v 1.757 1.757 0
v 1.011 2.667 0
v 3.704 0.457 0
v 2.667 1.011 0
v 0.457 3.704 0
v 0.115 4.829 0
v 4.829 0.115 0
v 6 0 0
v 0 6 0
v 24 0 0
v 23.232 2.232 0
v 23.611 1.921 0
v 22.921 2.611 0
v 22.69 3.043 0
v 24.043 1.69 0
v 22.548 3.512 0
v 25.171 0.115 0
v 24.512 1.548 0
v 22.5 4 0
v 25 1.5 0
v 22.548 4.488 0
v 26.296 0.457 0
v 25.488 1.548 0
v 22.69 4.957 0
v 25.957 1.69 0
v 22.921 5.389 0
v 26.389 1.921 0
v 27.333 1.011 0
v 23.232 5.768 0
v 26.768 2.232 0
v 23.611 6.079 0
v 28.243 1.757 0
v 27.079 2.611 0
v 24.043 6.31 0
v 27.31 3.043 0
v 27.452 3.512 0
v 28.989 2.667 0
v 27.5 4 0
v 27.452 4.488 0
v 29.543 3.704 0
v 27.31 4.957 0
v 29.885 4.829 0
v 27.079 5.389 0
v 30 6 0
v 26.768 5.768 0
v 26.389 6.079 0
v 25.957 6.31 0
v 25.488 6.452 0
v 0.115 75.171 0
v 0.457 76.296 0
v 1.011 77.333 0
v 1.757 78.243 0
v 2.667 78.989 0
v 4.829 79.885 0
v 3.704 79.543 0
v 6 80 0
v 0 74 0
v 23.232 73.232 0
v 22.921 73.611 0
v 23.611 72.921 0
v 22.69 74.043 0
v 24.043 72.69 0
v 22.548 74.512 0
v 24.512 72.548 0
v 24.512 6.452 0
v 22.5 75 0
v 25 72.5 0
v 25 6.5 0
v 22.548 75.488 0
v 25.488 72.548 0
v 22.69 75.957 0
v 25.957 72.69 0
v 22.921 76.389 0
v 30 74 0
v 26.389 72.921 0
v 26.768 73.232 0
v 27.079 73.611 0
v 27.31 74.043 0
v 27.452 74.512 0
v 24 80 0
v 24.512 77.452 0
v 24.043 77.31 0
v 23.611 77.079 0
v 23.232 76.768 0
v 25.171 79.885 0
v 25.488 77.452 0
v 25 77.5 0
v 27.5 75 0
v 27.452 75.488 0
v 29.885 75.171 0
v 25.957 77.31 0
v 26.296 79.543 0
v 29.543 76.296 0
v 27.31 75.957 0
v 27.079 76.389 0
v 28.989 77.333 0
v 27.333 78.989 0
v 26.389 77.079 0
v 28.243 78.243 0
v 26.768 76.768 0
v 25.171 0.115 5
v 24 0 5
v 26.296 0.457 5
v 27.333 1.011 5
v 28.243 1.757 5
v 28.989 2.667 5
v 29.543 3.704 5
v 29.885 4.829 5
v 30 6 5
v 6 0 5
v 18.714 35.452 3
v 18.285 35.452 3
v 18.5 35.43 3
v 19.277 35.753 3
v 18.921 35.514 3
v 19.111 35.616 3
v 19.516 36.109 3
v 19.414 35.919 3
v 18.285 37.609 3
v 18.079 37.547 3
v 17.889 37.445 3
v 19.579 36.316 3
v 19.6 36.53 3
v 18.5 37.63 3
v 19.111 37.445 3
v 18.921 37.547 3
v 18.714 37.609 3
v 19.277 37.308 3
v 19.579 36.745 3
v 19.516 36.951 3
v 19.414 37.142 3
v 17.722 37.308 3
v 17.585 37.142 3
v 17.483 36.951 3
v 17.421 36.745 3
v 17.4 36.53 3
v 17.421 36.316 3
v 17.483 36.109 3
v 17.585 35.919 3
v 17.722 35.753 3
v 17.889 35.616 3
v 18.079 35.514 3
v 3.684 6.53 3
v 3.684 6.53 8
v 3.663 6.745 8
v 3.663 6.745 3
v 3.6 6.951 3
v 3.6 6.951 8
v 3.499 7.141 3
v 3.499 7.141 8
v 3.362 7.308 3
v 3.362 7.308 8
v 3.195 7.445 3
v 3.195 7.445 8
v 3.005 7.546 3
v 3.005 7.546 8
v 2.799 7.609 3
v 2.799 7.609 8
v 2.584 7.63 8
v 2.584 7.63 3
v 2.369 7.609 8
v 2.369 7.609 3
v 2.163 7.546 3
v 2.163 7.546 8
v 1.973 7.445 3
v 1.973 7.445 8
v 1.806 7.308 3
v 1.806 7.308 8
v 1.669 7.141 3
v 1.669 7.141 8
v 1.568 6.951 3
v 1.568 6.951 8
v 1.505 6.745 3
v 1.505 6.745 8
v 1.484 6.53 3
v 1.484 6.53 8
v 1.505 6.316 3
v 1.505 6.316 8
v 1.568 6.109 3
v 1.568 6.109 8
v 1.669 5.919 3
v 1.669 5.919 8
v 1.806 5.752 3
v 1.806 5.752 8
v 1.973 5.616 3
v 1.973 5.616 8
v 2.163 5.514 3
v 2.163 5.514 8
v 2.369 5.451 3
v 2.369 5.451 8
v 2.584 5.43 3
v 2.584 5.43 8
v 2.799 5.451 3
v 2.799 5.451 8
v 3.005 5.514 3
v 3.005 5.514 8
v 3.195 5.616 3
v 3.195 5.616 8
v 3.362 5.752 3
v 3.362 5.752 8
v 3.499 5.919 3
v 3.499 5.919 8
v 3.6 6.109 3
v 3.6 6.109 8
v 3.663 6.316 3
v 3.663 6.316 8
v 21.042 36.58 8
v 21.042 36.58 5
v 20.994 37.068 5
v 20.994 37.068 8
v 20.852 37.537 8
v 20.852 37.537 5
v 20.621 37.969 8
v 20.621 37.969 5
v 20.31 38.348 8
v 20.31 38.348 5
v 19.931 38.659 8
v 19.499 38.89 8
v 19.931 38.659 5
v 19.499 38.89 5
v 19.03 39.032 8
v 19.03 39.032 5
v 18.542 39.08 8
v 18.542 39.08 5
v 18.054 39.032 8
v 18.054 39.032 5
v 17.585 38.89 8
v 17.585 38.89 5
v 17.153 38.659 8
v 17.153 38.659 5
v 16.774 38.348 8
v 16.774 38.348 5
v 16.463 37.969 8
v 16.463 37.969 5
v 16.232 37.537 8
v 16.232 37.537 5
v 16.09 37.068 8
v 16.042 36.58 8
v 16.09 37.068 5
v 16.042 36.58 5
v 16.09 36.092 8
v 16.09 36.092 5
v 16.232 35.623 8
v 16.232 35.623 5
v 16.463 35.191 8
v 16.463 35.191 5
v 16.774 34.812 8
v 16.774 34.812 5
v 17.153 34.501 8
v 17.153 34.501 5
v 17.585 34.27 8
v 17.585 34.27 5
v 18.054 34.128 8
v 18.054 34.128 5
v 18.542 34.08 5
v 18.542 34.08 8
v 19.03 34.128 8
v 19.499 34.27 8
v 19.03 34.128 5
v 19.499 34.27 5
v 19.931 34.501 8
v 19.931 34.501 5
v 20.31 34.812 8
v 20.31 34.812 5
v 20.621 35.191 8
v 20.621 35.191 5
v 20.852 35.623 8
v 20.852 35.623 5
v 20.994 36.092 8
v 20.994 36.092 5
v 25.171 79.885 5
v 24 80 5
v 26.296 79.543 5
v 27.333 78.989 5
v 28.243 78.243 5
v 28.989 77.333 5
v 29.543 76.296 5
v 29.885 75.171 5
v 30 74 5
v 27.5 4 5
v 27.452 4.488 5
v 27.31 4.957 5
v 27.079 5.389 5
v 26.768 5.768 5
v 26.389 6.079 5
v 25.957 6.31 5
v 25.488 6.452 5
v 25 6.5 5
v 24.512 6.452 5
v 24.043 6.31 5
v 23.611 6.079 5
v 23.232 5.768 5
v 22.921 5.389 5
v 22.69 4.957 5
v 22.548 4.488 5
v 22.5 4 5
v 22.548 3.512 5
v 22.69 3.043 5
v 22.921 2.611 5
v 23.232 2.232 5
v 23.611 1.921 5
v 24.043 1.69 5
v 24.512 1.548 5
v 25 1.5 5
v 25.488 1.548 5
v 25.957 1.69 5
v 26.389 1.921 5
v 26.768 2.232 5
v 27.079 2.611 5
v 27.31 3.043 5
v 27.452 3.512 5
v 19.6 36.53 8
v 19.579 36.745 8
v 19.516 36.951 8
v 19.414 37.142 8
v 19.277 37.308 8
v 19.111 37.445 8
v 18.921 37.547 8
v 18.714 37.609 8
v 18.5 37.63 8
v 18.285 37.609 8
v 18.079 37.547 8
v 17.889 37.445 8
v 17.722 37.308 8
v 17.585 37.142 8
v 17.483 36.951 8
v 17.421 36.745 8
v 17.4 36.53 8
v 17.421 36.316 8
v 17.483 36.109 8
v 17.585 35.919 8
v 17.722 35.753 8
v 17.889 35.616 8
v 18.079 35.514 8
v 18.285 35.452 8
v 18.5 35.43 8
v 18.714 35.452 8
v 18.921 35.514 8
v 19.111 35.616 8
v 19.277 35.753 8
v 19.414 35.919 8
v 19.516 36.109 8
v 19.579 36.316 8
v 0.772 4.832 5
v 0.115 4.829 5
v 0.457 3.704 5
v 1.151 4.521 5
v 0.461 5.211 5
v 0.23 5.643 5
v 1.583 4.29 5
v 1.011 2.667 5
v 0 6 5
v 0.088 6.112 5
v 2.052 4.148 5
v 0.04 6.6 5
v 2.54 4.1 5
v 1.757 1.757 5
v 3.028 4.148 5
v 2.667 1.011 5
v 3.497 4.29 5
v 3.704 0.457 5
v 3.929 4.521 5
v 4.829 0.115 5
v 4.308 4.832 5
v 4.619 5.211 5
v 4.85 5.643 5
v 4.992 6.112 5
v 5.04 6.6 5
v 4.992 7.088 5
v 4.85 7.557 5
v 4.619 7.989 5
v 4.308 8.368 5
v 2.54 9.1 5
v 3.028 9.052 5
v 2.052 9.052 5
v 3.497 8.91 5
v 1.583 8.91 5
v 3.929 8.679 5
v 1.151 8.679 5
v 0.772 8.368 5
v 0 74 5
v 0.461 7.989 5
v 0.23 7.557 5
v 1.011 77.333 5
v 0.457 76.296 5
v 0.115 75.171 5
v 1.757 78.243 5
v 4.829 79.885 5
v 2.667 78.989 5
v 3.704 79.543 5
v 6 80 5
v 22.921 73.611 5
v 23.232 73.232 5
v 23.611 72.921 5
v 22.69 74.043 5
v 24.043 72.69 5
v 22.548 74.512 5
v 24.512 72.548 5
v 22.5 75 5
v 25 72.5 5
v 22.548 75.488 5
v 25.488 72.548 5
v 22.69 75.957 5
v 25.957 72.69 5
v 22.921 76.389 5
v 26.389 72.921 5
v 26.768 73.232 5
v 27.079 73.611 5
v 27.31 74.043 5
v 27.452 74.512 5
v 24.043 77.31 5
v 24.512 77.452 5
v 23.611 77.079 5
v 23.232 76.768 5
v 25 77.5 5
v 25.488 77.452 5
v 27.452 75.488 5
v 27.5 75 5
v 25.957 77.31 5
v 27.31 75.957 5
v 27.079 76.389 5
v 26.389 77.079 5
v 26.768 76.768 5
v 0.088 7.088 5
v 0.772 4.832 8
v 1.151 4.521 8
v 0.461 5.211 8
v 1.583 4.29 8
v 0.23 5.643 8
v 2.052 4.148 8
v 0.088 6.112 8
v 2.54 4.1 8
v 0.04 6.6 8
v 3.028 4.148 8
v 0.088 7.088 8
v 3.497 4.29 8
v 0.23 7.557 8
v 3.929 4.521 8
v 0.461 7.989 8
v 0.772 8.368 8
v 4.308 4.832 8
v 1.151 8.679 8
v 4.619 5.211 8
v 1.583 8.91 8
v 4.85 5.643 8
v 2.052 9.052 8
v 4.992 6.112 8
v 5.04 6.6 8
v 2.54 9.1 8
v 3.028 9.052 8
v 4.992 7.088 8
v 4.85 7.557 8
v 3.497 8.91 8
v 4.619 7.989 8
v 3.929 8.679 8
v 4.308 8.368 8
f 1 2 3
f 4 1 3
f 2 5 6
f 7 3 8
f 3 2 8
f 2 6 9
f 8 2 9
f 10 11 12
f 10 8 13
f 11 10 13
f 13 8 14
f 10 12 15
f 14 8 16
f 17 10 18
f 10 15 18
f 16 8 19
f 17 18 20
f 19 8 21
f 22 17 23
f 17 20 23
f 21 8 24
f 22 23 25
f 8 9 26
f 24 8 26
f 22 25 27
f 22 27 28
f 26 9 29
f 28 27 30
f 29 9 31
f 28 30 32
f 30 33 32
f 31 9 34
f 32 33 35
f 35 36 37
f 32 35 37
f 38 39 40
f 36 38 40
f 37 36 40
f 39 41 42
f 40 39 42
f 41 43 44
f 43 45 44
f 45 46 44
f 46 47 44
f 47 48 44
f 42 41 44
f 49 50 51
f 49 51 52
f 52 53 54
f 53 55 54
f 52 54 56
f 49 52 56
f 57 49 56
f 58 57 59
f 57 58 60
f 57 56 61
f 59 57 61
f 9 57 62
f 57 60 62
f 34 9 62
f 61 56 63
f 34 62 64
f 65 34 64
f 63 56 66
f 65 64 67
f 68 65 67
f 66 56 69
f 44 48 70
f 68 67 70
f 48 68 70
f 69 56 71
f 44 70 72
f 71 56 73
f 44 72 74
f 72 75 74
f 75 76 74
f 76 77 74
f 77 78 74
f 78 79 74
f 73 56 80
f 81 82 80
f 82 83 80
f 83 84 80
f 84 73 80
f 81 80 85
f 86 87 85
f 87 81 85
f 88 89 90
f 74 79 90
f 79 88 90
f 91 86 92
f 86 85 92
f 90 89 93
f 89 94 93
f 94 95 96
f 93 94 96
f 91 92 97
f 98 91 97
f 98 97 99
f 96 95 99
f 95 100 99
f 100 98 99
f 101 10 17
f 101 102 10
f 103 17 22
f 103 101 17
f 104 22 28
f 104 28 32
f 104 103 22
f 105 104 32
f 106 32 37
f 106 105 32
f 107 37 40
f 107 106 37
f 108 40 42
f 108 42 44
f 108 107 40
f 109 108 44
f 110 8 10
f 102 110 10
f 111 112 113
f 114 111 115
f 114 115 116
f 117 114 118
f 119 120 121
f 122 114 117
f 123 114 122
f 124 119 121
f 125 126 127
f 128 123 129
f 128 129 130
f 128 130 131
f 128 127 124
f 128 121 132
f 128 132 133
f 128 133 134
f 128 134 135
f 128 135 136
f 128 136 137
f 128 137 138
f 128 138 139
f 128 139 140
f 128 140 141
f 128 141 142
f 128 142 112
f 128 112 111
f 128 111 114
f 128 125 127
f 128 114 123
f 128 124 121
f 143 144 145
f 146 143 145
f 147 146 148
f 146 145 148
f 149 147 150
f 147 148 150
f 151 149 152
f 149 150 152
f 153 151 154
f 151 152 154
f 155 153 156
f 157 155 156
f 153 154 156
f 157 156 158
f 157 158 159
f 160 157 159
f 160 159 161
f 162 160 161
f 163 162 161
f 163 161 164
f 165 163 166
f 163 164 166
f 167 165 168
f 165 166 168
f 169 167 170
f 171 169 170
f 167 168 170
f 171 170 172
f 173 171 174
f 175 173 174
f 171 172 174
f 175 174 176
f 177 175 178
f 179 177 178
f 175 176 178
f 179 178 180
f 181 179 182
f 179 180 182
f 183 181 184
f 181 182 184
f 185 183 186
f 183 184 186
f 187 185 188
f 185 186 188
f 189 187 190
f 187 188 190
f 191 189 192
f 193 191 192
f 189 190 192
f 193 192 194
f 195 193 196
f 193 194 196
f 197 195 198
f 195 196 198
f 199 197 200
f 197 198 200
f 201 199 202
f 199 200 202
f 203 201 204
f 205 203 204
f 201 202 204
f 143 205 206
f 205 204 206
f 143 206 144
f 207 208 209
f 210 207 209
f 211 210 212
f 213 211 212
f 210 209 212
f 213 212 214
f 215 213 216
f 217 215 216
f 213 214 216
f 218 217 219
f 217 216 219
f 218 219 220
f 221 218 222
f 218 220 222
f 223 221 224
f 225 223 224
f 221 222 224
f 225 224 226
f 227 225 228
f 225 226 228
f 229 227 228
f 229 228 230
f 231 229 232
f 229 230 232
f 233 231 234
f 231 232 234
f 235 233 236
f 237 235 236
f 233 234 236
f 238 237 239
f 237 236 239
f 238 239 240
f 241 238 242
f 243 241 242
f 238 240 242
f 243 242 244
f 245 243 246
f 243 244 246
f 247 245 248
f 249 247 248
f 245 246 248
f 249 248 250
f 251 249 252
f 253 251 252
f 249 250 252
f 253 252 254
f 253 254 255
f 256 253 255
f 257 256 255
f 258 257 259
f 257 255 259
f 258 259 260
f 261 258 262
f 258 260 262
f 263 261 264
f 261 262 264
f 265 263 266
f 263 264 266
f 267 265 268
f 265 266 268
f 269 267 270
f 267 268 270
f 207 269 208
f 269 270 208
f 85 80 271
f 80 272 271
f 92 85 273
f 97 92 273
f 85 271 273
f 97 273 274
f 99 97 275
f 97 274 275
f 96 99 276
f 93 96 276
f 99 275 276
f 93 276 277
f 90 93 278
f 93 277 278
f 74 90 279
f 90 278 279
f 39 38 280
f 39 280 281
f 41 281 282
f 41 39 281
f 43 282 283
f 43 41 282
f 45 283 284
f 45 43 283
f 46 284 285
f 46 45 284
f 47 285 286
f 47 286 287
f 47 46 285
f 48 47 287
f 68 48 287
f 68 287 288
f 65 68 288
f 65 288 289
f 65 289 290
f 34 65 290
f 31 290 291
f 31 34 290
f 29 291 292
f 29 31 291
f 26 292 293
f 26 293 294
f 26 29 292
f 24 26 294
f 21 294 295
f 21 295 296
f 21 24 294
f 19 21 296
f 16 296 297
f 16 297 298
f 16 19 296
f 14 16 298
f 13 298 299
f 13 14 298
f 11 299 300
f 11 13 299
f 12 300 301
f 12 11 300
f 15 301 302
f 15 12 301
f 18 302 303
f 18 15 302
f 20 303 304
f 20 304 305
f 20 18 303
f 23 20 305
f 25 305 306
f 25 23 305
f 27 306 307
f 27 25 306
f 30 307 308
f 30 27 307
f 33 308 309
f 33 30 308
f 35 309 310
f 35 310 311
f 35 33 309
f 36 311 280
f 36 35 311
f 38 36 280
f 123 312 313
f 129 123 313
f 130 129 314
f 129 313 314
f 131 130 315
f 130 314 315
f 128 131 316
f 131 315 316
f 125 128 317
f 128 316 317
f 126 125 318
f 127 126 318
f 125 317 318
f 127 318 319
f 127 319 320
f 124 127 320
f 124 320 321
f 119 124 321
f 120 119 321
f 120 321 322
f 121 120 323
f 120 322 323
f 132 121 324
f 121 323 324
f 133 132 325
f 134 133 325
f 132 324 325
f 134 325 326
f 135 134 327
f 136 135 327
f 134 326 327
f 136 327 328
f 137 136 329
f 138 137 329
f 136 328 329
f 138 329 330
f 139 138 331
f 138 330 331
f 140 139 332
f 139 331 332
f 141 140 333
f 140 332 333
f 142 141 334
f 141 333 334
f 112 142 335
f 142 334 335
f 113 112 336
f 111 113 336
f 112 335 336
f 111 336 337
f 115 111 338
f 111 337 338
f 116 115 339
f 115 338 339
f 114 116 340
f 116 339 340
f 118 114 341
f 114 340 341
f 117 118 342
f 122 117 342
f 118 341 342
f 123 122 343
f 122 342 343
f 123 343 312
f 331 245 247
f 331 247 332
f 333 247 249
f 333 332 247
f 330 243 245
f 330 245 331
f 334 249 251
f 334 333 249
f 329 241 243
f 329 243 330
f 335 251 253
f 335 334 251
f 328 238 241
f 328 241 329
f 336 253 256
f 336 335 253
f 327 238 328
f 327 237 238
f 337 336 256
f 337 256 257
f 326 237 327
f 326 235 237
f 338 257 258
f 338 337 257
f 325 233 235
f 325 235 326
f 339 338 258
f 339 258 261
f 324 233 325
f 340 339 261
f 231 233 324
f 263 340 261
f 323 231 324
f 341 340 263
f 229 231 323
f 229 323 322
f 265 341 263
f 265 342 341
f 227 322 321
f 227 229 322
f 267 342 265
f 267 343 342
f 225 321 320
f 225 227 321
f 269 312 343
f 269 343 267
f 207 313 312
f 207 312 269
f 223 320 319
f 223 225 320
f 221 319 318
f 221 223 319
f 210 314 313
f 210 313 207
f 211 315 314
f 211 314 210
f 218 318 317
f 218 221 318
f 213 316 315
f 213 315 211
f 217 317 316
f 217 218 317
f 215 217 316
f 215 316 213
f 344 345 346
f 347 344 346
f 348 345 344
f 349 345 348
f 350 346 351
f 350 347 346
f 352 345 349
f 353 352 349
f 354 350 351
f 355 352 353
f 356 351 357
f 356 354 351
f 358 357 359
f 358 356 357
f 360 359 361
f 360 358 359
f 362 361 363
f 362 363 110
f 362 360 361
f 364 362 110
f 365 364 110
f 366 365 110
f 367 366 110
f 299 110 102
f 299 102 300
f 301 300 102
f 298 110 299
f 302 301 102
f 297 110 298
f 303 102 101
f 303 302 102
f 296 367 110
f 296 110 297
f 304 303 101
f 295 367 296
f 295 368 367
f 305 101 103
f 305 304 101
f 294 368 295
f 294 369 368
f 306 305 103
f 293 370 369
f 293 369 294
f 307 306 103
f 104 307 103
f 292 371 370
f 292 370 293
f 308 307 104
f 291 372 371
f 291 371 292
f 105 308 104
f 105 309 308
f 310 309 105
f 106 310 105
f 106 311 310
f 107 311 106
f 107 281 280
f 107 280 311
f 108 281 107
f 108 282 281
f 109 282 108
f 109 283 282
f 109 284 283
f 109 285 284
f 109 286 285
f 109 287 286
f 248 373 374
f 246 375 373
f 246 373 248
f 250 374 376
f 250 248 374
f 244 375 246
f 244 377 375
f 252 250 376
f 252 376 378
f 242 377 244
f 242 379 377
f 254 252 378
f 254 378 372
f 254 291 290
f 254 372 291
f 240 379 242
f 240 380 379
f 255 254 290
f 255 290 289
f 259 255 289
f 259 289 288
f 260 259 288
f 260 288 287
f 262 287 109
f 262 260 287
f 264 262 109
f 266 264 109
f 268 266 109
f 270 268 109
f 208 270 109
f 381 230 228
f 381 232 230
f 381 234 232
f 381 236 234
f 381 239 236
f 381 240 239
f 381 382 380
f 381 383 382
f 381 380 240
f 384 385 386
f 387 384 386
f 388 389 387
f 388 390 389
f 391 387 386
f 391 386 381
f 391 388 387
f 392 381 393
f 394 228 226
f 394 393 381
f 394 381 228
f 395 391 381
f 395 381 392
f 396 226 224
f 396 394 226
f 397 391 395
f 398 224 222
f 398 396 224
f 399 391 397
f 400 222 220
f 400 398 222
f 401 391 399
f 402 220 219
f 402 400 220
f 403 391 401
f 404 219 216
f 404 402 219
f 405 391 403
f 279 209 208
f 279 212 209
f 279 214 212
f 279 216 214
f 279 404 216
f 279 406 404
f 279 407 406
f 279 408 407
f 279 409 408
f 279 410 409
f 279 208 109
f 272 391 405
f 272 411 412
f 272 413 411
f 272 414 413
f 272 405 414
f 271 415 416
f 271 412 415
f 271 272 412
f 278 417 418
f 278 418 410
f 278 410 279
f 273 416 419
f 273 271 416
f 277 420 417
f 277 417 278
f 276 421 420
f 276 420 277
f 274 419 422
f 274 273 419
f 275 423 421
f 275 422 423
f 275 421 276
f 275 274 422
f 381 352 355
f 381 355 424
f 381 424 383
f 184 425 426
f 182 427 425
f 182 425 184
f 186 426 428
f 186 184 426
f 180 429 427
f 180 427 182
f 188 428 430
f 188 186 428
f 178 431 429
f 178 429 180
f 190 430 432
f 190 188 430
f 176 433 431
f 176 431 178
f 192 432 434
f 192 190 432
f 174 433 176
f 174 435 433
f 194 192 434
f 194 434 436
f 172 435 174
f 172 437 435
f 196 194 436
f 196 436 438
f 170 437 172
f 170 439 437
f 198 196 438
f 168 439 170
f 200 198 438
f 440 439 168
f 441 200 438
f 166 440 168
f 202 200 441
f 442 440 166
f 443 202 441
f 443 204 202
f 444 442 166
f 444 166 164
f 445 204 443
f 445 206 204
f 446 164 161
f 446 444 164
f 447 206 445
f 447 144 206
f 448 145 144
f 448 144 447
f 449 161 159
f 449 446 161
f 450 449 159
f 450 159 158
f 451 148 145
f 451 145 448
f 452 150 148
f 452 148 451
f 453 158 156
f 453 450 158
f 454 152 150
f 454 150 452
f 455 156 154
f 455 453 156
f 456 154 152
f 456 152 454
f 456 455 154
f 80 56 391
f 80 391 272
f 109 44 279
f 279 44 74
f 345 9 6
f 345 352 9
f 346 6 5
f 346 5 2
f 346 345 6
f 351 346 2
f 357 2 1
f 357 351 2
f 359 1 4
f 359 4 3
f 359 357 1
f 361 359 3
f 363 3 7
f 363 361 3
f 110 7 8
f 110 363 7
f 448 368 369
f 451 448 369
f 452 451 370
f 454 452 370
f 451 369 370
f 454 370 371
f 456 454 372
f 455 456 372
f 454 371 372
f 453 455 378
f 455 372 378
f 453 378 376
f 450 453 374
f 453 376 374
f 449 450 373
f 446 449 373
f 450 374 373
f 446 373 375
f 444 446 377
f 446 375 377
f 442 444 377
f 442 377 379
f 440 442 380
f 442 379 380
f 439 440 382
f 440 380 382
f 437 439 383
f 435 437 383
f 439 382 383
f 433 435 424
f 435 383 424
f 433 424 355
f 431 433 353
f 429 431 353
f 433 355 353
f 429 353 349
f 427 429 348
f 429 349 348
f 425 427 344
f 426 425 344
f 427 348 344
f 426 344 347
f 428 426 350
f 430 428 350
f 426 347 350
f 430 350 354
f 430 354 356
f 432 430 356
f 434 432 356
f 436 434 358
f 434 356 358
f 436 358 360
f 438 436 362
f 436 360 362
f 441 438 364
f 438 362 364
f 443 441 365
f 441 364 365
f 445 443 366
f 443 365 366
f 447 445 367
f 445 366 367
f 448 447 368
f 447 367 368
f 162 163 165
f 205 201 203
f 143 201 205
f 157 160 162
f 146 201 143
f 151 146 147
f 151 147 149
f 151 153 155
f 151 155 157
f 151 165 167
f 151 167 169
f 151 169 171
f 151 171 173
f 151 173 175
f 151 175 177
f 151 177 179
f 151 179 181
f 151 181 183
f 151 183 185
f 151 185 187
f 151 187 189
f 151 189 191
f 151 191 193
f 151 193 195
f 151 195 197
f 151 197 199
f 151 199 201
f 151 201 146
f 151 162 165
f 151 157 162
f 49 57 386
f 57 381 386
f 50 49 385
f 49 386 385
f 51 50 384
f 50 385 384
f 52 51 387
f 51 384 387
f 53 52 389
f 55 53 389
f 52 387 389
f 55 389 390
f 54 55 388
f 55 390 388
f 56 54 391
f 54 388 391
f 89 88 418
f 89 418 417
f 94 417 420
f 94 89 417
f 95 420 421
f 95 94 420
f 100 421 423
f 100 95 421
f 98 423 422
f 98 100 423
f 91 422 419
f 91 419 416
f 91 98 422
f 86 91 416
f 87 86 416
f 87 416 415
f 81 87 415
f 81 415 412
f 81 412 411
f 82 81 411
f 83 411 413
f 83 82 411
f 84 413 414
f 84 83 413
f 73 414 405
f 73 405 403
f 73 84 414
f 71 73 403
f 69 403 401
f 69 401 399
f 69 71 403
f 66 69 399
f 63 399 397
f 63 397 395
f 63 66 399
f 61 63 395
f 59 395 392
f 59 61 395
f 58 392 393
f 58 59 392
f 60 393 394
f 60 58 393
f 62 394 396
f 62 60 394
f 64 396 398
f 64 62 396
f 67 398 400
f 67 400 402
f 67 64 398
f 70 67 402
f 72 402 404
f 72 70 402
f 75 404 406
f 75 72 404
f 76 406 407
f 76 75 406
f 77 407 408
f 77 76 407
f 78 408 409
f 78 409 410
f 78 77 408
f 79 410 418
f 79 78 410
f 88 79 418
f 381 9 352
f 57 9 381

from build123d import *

# Parameters (mm, degrees)
SKETCH_W     = 30
SKETCH_H     = 80
SKETCH_R     = 2.5
PAD_DEPTH    = 5
SKETCH001_R  = 2.5
PAD001_DEPTH = 3
SKETCH002_R  = 1.1
POCKET_DEPTH = 5
FILLET_R     = 6


with BuildPart() as part:
    # Sketch → Pad (new body)
    with BuildSketch(Plane.XY):
        with Locations((15, 40)):
            Rectangle(SKETCH_W, SKETCH_H)
        with Locations((25, 4)):
            Circle(SKETCH_R, mode=Mode.SUBTRACT)
        with Locations((25, 75)):
            Circle(SKETCH_R, mode=Mode.SUBTRACT)
    extrude(amount=PAD_DEPTH)

    # Sketch001 (on Face8 of Pad) → Pad001 (join)
    with BuildSketch(Plane.XY.offset(5)):
        with Locations((2.54, 6.6)):
            Circle(SKETCH001_R)
        with Locations((18.542, 36.58)):
            Circle(SKETCH001_R)
    extrude(amount=PAD001_DEPTH)

    # Sketch002 (on DatumPlane) → Pocket (cut)
    with BuildSketch(Plane.XY.offset(8)):
        with Locations((2.583942, 6.530214)):
            Circle(SKETCH002_R)
        with Locations((18.499644, 36.530405)):
            Circle(SKETCH002_R)
    extrude(amount=-POCKET_DEPTH, mode=Mode.SUBTRACT)

    # Fillet
    fillet_edges = [part.edges().sort_by_distance(p)[0] for p in [
        (30, 0, 2.5),
        (0, 0, 2.5),
        (30, 80, 2.5),
        (0, 80, 2.5),
    ]]
    fillet(fillet_edges, radius=FILLET_R)


solid = part.part
